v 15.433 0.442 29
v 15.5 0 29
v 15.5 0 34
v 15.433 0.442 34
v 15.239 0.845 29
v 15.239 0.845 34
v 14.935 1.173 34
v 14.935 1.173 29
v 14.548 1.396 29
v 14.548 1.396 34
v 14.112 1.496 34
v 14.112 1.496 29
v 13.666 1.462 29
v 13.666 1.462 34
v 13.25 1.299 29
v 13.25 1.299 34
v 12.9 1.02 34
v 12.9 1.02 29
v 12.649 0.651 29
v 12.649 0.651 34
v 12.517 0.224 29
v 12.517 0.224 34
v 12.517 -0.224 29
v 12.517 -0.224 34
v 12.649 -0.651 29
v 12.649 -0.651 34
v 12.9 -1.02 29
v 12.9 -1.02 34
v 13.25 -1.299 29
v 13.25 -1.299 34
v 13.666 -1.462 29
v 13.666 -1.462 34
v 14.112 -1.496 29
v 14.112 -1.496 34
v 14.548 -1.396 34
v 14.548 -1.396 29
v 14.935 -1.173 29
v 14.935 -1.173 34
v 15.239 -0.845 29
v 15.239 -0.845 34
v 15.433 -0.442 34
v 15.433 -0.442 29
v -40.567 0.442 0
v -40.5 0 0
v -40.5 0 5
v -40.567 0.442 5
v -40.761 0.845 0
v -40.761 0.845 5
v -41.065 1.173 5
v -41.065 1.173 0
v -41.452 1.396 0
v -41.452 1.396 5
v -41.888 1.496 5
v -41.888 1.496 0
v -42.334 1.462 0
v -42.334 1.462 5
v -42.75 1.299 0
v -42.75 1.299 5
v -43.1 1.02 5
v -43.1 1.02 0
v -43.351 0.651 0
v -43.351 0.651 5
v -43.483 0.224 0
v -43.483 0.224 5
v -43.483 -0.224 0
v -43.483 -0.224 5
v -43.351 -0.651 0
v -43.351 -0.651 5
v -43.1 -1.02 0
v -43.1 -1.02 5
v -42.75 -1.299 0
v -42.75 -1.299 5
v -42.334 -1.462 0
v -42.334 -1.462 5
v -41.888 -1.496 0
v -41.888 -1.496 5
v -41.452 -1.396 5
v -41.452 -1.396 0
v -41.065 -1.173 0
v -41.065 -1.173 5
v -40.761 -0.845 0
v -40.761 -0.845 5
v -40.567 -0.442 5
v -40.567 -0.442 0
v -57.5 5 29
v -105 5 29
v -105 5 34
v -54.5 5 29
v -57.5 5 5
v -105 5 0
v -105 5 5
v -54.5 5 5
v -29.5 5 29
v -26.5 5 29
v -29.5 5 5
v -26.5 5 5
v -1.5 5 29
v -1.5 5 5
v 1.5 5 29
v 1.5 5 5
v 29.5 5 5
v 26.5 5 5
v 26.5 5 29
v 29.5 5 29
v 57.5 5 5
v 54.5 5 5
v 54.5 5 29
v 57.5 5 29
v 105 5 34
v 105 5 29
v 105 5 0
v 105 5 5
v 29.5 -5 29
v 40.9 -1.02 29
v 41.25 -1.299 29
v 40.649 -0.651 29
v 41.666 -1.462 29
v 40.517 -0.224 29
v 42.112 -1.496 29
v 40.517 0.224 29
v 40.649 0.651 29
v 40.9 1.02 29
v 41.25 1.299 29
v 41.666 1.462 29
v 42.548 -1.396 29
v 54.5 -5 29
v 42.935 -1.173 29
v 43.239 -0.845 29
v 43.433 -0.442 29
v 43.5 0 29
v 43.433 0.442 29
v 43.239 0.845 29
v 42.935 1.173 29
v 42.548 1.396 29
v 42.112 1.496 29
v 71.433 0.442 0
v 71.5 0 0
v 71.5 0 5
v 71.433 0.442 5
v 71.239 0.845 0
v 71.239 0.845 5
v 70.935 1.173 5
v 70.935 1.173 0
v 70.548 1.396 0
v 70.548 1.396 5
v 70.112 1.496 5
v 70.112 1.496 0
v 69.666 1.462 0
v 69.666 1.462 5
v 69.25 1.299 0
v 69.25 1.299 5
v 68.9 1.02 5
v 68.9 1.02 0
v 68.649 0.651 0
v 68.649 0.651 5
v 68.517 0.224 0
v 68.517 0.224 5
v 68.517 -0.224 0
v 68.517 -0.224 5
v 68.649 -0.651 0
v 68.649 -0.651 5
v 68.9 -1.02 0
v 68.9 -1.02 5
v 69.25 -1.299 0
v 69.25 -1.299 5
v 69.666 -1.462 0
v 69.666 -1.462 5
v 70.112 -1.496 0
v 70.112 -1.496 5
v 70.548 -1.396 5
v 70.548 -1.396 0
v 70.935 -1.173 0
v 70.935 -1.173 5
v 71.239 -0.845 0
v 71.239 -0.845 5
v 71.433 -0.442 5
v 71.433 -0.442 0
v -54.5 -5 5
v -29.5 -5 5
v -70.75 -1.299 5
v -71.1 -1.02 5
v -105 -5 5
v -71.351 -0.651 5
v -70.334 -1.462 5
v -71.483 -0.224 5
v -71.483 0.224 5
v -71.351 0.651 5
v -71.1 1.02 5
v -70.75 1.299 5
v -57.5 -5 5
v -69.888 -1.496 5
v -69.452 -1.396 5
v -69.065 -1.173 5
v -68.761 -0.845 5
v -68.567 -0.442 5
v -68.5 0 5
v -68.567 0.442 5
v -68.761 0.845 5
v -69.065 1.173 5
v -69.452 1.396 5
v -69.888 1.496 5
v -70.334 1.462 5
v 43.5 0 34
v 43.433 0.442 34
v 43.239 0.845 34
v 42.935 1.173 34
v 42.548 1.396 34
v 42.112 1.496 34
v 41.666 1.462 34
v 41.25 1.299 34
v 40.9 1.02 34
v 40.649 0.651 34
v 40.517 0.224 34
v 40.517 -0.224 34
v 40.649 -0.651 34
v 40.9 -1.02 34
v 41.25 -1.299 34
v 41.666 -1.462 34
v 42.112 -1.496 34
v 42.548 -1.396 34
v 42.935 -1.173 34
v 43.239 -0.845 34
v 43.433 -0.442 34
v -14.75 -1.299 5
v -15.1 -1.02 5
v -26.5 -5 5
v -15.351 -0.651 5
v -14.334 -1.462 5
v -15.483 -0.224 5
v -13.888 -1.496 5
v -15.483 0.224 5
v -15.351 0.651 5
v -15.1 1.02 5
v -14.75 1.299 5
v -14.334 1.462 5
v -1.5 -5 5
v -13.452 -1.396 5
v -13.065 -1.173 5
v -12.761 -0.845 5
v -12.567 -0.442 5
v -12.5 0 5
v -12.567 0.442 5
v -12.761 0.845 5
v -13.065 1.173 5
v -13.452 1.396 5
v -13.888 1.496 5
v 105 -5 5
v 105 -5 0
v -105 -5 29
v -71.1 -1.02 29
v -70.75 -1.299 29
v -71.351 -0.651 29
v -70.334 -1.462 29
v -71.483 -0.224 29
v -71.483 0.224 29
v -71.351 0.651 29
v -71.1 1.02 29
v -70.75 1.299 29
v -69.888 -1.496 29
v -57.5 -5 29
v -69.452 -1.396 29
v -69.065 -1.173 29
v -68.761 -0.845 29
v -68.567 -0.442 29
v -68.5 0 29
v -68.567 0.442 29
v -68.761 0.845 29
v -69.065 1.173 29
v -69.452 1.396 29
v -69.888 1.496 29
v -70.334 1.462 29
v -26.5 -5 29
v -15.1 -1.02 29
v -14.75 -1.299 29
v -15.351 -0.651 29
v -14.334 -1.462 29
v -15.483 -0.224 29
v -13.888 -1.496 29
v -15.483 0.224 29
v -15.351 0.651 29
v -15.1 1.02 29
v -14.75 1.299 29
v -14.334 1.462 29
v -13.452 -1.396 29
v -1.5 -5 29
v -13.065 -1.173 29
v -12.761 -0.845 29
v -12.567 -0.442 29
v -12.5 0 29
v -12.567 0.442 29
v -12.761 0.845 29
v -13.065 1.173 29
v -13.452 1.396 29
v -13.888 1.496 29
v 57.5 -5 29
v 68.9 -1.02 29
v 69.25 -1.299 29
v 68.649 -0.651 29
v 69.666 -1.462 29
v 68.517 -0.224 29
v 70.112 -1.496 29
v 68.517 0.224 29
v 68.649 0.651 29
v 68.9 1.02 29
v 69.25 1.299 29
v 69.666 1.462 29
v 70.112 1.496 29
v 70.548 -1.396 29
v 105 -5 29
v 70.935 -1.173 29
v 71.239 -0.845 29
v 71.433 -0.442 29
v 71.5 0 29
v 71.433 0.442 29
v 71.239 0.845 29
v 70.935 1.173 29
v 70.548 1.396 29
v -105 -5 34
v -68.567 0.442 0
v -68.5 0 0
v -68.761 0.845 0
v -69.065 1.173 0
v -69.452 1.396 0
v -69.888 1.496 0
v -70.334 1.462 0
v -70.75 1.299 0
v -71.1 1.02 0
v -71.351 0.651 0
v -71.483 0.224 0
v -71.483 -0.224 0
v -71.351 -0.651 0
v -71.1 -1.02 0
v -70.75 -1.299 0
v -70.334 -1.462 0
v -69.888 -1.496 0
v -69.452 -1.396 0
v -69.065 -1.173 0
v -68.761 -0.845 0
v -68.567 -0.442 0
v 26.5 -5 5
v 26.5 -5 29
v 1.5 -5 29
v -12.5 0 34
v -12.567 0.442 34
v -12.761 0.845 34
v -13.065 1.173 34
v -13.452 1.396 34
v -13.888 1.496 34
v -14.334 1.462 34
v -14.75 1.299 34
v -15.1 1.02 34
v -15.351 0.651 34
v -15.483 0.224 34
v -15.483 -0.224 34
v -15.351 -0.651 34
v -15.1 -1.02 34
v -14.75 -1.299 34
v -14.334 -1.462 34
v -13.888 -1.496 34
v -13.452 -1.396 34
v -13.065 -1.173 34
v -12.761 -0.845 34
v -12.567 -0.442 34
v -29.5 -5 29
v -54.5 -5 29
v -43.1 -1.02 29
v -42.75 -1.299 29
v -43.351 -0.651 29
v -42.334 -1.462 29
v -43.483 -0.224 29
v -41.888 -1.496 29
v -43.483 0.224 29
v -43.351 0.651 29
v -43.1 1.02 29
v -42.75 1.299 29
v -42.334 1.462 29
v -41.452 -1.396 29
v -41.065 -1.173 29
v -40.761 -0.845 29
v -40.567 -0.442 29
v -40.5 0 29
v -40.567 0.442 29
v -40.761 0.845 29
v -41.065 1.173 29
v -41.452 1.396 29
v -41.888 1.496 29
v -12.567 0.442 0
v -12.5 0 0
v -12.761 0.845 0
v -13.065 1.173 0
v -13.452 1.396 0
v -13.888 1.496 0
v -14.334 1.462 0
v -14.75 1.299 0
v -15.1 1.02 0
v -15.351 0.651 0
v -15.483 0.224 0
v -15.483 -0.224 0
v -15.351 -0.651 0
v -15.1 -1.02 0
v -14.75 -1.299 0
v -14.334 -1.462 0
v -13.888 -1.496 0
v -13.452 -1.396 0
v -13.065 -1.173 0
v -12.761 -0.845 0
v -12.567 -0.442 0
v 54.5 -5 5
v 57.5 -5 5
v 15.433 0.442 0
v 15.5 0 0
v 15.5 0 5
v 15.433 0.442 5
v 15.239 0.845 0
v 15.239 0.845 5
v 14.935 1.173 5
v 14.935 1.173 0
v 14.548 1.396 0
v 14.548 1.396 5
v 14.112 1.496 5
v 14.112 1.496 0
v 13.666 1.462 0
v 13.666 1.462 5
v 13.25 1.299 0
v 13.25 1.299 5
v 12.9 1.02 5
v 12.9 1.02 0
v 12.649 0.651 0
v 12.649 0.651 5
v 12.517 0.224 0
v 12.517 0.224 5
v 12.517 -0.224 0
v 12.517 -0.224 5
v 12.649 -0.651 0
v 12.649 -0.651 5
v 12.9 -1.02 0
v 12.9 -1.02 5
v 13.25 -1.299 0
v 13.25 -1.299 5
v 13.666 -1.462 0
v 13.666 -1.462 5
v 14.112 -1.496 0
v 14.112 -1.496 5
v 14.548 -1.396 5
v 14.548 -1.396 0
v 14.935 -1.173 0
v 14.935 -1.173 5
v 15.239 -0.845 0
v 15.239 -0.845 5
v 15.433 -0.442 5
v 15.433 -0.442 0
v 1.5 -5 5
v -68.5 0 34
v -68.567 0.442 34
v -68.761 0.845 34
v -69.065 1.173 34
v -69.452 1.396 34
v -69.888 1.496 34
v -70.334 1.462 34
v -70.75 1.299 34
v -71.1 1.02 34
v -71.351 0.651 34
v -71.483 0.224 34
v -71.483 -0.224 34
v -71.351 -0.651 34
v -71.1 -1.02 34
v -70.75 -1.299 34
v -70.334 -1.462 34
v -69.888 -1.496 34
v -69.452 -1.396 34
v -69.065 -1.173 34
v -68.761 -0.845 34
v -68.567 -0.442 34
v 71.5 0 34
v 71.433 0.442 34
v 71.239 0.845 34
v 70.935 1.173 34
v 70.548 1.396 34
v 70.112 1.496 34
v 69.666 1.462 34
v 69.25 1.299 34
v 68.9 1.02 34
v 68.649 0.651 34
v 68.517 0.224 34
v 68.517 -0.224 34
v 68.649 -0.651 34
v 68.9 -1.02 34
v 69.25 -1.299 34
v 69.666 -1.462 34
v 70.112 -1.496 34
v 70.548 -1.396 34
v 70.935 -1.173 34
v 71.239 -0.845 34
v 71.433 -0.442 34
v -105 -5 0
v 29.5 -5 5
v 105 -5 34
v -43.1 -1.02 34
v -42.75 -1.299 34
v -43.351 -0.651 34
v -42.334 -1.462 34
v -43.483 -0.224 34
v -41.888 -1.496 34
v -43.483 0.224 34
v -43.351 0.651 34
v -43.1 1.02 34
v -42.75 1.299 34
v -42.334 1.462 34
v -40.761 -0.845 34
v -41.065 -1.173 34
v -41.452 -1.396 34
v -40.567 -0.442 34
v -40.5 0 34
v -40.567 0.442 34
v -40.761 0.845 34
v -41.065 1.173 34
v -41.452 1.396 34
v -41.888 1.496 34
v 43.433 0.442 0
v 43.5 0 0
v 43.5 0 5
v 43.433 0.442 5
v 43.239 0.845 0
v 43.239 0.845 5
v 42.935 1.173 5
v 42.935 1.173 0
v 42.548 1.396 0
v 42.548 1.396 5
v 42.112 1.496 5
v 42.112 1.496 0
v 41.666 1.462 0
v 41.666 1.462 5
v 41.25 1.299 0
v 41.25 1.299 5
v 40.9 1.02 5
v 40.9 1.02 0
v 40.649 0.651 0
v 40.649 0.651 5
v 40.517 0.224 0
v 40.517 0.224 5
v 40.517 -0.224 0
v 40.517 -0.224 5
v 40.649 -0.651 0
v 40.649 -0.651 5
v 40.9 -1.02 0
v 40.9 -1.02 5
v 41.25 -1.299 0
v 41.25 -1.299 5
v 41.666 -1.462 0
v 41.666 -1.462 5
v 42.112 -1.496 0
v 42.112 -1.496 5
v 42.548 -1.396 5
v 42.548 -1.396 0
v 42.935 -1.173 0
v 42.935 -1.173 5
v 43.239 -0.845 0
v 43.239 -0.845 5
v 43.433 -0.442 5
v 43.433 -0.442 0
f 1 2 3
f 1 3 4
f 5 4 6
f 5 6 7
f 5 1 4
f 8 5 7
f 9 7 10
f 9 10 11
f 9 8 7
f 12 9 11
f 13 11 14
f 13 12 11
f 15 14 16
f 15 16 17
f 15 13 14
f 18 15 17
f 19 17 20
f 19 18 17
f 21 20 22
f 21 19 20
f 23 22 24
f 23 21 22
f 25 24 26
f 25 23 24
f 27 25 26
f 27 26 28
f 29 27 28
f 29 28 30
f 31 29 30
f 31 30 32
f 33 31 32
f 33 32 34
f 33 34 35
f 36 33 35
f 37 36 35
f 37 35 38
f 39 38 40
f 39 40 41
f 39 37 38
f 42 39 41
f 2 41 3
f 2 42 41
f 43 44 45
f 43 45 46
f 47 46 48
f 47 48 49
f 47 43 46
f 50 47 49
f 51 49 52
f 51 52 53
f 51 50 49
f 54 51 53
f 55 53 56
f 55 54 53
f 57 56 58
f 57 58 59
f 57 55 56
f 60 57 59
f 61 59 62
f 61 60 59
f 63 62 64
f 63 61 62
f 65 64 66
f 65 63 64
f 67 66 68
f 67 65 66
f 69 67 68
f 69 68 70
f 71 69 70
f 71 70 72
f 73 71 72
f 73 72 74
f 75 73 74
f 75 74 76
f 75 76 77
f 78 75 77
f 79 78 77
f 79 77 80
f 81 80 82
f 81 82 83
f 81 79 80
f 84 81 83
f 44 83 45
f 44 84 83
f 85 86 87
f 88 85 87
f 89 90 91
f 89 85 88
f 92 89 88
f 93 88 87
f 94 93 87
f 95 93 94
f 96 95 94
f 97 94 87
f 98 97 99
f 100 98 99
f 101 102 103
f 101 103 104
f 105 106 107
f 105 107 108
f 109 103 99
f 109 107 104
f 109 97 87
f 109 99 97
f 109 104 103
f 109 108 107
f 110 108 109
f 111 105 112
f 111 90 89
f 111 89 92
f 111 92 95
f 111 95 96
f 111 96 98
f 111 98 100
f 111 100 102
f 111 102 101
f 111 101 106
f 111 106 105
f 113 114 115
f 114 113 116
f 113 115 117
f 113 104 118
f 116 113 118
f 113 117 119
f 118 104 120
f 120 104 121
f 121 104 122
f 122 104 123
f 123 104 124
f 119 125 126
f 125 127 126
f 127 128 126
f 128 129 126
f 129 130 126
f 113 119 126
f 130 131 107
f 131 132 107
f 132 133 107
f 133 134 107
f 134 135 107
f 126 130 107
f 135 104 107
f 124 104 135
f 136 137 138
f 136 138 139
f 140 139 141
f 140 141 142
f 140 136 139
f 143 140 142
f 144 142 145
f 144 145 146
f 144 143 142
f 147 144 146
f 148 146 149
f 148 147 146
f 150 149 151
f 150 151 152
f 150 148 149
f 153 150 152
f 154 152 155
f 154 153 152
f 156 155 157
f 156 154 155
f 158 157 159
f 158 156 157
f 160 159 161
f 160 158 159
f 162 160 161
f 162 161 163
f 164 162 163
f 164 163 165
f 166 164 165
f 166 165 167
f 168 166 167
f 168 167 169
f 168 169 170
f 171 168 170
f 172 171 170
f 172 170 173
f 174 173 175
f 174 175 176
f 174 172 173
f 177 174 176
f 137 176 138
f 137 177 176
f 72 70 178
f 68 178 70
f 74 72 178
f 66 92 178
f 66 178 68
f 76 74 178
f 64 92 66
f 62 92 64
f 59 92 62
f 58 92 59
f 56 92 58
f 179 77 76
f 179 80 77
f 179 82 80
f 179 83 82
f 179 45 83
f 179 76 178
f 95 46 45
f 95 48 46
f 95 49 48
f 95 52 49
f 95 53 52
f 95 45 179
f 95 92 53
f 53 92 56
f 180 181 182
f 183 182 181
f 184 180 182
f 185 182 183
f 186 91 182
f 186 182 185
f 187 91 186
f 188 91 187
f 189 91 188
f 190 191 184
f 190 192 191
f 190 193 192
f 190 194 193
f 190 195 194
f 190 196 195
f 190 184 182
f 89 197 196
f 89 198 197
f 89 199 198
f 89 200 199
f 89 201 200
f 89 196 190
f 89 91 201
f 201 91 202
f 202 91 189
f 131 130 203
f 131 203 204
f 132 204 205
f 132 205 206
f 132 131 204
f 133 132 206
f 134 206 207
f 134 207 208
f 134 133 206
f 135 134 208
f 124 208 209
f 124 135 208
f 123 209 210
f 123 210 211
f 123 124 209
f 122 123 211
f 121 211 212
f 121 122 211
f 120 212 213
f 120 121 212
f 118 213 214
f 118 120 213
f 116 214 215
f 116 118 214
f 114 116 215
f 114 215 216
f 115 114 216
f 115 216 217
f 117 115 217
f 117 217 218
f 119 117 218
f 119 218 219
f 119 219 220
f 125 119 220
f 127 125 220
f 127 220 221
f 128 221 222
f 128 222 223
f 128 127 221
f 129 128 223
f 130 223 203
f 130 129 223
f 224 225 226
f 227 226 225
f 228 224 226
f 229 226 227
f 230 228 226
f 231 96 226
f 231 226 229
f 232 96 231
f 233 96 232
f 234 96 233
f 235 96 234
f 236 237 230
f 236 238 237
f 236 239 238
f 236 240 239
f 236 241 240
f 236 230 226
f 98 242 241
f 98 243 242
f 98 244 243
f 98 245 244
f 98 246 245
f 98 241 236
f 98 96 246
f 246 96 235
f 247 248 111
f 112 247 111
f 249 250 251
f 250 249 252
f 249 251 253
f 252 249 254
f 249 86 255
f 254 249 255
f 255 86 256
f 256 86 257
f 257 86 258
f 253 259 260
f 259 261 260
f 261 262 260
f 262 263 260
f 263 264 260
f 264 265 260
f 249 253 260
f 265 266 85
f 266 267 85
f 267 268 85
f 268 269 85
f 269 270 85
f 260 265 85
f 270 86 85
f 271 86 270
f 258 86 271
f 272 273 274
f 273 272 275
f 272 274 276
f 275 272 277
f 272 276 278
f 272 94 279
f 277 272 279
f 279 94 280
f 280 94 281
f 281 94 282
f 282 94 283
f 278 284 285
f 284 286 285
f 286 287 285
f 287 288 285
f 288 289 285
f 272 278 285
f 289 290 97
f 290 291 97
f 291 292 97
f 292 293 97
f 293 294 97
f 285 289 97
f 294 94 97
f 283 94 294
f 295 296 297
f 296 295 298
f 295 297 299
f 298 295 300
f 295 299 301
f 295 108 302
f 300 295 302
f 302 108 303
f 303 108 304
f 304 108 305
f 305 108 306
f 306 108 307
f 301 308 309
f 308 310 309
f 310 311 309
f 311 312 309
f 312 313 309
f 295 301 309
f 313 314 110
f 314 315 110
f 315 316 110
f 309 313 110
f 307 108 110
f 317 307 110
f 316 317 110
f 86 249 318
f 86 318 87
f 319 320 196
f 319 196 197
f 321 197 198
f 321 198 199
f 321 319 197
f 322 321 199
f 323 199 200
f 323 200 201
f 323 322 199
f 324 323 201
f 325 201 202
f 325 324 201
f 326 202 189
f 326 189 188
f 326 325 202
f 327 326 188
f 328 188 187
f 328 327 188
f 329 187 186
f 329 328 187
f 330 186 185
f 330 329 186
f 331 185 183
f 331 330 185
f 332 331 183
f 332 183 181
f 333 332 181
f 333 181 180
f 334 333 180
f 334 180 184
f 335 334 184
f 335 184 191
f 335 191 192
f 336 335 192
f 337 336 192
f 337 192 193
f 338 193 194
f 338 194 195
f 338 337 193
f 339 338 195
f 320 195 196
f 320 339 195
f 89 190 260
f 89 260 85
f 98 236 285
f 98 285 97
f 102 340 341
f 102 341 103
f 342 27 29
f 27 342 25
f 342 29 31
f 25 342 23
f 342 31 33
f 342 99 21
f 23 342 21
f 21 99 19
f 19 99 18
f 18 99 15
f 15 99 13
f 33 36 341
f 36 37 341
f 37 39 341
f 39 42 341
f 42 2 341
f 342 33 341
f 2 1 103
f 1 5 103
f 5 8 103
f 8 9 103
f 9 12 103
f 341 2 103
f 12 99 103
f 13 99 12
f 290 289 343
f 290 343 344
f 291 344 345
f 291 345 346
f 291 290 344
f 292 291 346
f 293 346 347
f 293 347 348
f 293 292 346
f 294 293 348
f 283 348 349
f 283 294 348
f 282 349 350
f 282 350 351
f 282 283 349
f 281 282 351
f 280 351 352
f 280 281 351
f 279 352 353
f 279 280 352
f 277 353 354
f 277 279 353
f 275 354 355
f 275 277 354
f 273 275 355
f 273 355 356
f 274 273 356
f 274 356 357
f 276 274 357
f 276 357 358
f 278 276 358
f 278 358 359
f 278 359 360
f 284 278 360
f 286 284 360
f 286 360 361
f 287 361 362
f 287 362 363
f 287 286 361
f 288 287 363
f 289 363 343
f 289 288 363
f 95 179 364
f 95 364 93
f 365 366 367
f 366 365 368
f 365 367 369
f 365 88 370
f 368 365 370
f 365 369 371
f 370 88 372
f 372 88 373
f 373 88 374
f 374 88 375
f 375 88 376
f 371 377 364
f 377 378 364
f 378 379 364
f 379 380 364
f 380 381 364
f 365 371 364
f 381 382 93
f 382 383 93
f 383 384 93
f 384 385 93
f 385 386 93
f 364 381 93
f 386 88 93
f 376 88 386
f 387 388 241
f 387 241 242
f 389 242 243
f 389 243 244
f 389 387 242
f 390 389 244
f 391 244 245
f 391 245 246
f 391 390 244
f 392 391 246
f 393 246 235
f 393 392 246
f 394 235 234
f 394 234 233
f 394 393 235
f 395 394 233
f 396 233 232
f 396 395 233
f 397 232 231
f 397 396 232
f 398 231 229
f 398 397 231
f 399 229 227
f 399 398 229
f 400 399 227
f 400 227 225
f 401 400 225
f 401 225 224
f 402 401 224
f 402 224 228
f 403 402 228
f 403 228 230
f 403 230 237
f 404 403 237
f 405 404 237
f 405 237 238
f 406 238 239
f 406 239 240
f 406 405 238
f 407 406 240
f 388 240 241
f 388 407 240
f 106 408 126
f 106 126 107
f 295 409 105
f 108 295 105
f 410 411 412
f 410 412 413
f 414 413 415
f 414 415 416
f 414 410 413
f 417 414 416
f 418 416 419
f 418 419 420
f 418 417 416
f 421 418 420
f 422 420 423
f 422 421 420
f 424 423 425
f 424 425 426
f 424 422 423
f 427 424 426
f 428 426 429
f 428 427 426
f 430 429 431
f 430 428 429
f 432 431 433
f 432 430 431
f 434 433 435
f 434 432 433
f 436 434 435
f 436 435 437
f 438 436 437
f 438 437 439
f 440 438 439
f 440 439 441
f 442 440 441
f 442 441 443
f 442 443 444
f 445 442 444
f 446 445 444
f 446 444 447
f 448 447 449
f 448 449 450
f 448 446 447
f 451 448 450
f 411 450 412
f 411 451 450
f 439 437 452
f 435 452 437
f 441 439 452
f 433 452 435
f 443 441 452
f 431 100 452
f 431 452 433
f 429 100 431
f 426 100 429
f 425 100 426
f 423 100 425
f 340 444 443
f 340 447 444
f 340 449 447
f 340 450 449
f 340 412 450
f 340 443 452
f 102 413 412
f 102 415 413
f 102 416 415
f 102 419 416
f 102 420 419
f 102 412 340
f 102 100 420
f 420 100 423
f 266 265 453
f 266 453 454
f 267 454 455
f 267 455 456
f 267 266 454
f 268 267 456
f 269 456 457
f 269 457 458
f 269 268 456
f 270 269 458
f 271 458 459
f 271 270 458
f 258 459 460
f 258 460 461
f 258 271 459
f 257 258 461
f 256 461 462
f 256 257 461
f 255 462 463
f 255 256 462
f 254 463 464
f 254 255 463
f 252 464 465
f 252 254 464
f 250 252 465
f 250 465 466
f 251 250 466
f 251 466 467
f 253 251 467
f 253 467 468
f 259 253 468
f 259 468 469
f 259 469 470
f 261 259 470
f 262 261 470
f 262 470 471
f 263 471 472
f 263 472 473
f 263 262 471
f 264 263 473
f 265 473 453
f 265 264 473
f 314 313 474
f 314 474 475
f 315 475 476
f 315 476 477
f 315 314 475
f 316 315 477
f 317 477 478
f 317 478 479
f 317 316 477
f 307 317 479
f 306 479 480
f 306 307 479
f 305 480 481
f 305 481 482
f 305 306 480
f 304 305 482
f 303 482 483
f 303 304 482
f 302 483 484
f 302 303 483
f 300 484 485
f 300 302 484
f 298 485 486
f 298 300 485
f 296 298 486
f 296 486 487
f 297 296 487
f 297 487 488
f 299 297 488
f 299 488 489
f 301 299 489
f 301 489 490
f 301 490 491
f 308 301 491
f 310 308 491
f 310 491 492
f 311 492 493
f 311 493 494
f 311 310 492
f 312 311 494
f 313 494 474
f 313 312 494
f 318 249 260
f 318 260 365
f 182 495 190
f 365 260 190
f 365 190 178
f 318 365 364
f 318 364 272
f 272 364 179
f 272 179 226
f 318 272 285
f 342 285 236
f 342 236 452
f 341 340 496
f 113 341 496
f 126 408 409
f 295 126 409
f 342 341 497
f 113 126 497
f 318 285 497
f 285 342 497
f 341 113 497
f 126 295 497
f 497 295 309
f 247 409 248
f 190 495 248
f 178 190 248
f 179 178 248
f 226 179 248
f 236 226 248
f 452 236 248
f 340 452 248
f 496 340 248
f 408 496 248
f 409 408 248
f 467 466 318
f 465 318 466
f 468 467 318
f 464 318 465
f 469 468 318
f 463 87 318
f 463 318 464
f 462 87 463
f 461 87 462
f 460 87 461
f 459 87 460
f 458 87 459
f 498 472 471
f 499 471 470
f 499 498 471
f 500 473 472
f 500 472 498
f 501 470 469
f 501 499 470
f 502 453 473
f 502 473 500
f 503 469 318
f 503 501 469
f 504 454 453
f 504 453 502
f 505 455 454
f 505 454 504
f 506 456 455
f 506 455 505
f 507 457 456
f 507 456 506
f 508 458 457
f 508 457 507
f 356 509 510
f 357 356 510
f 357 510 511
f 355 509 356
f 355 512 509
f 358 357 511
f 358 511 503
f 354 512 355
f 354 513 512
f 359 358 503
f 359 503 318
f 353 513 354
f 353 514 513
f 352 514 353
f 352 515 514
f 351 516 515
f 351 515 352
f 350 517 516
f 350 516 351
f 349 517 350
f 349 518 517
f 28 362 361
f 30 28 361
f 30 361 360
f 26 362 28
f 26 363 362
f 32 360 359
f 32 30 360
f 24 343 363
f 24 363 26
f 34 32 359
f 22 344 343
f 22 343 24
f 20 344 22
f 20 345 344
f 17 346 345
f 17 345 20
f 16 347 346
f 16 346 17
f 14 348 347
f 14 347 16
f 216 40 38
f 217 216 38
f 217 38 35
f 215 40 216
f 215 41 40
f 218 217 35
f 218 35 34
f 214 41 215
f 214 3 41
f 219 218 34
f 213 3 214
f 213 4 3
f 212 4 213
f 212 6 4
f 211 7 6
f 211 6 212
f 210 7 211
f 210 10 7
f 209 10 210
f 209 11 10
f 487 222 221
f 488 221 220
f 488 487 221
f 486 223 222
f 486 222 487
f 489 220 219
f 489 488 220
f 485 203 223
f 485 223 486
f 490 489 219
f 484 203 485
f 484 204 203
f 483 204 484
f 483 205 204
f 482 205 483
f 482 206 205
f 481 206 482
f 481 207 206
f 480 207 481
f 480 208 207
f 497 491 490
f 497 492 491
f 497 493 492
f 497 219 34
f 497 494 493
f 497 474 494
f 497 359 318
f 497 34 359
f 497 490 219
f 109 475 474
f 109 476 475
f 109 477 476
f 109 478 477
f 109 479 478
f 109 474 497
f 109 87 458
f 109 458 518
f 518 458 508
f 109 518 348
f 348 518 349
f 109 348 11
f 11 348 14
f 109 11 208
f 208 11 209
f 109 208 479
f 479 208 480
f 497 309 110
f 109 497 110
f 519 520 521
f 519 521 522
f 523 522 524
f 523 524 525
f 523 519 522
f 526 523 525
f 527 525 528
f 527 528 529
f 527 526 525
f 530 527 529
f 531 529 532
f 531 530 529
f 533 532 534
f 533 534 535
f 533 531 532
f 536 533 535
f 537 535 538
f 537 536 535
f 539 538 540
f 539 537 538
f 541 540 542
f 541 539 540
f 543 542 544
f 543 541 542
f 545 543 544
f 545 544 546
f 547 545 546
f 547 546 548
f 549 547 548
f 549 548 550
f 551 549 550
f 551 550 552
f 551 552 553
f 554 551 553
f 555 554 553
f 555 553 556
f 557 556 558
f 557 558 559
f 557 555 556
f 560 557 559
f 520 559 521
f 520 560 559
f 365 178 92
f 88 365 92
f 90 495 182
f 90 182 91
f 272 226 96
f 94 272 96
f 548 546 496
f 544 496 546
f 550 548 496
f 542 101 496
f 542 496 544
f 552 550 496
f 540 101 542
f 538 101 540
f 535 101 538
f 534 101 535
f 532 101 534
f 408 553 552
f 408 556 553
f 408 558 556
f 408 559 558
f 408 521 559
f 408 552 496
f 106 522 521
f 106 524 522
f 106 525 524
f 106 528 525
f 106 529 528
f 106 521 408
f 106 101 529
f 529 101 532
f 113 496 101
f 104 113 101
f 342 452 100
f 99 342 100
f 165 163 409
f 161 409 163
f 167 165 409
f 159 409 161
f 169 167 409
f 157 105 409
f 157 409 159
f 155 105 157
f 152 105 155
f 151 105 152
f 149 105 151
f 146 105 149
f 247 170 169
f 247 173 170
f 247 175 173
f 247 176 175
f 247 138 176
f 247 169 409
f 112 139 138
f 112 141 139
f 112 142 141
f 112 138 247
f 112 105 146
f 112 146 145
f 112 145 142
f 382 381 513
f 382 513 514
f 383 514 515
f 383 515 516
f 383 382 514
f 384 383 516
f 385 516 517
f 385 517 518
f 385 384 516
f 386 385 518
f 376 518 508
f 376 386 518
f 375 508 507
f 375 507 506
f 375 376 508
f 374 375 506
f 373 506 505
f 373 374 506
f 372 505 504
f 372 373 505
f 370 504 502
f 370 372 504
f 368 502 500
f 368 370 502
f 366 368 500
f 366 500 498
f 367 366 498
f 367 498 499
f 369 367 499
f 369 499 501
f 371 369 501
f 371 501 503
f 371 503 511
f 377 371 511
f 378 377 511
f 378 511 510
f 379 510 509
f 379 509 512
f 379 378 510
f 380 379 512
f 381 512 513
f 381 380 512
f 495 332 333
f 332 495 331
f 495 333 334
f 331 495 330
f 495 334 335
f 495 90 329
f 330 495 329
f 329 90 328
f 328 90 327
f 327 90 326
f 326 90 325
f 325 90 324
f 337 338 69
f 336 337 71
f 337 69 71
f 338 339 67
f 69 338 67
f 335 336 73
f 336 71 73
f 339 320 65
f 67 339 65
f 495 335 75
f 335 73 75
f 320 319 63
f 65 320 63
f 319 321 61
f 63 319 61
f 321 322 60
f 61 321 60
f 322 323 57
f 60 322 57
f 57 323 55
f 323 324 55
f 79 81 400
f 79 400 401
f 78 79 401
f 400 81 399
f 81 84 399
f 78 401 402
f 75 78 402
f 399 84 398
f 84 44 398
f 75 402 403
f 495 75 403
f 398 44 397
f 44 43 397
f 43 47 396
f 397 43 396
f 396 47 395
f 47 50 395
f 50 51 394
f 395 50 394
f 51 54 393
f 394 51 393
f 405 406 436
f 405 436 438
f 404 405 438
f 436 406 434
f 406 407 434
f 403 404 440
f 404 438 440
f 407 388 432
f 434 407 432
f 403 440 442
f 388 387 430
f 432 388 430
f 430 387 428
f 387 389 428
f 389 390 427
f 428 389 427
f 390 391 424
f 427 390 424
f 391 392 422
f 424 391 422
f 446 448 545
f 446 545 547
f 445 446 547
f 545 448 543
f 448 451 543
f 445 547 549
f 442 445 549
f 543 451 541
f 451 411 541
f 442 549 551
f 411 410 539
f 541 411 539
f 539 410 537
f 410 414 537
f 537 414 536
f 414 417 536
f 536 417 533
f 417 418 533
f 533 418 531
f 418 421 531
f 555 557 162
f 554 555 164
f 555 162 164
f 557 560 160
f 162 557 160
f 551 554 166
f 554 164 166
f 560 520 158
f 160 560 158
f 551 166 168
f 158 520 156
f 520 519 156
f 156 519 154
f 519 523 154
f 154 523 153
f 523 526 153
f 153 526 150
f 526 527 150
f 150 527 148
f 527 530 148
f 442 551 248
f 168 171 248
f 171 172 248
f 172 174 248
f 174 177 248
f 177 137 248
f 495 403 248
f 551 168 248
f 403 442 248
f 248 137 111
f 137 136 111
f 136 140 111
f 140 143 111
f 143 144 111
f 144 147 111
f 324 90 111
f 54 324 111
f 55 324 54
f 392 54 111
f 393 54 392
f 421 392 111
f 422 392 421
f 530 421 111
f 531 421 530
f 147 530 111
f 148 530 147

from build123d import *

# Parameters (mm, degrees)
SKETCH_1_W      = 210
SKETCH_1_H      = 10
SKETCH_1_R      = 1.5
EXTRUDE_1_DEPTH = 5
EXTRUDE_START   = 29
SKETCH_1_3_W    = 210
SKETCH_1_3_H    = 10
SKETCH_1_3_R    = 1.5
EXTRUDE_2_DEPTH = 5
SKETCH_1_4_W    = 3
SKETCH_1_4_H    = 10
EXTRUDE_3_DEPTH = 29


with BuildPart() as part:
    # 草图1 → 凸台-拉伸1 (new body)
    with BuildSketch(Plane.XY):
        Rectangle(SKETCH_1_W, SKETCH_1_H)
        with Locations((-70, 0)):
            Circle(SKETCH_1_R, mode=Mode.SUBTRACT)
        with Locations((-42, 0)):
            Circle(SKETCH_1_R, mode=Mode.SUBTRACT)
        with Locations((-14, 0)):
            Circle(SKETCH_1_R, mode=Mode.SUBTRACT)
        with Locations((14, 0)):
            Circle(SKETCH_1_R, mode=Mode.SUBTRACT)
        with Locations((42, 0)):
            Circle(SKETCH_1_R, mode=Mode.SUBTRACT)
        with Locations((70, 0)):
            Circle(SKETCH_1_R, mode=Mode.SUBTRACT)
    extrude(amount=EXTRUDE_1_DEPTH)



with BuildPart() as body_2:
    # 草图1<3> → 凸台-拉伸2 (new body)
    with BuildSketch(Plane.XY.offset(EXTRUDE_START)):
        Rectangle(SKETCH_1_3_W, SKETCH_1_3_H)
        with Locations((-70, 0)):
            Circle(SKETCH_1_3_R, mode=Mode.SUBTRACT)
        with Locations((-42, 0)):
            Circle(SKETCH_1_3_R, mode=Mode.SUBTRACT)
        with Locations((-14, 0)):
            Circle(SKETCH_1_3_R, mode=Mode.SUBTRACT)
        with Locations((14, 0)):
            Circle(SKETCH_1_3_R, mode=Mode.SUBTRACT)
        with Locations((42, 0)):
            Circle(SKETCH_1_3_R, mode=Mode.SUBTRACT)
        with Locations((70, 0)):
            Circle(SKETCH_1_3_R, mode=Mode.SUBTRACT)
    extrude(amount=EXTRUDE_2_DEPTH)


with BuildPart() as part_1:
    add(part.part)

    add(body_2.part)  # 凸台-拉伸3 merges body 2
    # 草图1<4> → 凸台-拉伸3 (add)
    with BuildSketch(Plane.XY):
        with Locations((-56, 0)):
            Rectangle(SKETCH_1_4_W, SKETCH_1_4_H)
        with Locations((-28, 0)):
            Rectangle(SKETCH_1_4_W, SKETCH_1_4_H)
        Rectangle(SKETCH_1_4_W, SKETCH_1_4_H)
        with Locations((28, 0)):
            Rectangle(SKETCH_1_4_W, SKETCH_1_4_H)
        with Locations((56, 0)):
            Rectangle(SKETCH_1_4_W, SKETCH_1_4_H)
    extrude(amount=EXTRUDE_3_DEPTH)


solid = part_1.part
